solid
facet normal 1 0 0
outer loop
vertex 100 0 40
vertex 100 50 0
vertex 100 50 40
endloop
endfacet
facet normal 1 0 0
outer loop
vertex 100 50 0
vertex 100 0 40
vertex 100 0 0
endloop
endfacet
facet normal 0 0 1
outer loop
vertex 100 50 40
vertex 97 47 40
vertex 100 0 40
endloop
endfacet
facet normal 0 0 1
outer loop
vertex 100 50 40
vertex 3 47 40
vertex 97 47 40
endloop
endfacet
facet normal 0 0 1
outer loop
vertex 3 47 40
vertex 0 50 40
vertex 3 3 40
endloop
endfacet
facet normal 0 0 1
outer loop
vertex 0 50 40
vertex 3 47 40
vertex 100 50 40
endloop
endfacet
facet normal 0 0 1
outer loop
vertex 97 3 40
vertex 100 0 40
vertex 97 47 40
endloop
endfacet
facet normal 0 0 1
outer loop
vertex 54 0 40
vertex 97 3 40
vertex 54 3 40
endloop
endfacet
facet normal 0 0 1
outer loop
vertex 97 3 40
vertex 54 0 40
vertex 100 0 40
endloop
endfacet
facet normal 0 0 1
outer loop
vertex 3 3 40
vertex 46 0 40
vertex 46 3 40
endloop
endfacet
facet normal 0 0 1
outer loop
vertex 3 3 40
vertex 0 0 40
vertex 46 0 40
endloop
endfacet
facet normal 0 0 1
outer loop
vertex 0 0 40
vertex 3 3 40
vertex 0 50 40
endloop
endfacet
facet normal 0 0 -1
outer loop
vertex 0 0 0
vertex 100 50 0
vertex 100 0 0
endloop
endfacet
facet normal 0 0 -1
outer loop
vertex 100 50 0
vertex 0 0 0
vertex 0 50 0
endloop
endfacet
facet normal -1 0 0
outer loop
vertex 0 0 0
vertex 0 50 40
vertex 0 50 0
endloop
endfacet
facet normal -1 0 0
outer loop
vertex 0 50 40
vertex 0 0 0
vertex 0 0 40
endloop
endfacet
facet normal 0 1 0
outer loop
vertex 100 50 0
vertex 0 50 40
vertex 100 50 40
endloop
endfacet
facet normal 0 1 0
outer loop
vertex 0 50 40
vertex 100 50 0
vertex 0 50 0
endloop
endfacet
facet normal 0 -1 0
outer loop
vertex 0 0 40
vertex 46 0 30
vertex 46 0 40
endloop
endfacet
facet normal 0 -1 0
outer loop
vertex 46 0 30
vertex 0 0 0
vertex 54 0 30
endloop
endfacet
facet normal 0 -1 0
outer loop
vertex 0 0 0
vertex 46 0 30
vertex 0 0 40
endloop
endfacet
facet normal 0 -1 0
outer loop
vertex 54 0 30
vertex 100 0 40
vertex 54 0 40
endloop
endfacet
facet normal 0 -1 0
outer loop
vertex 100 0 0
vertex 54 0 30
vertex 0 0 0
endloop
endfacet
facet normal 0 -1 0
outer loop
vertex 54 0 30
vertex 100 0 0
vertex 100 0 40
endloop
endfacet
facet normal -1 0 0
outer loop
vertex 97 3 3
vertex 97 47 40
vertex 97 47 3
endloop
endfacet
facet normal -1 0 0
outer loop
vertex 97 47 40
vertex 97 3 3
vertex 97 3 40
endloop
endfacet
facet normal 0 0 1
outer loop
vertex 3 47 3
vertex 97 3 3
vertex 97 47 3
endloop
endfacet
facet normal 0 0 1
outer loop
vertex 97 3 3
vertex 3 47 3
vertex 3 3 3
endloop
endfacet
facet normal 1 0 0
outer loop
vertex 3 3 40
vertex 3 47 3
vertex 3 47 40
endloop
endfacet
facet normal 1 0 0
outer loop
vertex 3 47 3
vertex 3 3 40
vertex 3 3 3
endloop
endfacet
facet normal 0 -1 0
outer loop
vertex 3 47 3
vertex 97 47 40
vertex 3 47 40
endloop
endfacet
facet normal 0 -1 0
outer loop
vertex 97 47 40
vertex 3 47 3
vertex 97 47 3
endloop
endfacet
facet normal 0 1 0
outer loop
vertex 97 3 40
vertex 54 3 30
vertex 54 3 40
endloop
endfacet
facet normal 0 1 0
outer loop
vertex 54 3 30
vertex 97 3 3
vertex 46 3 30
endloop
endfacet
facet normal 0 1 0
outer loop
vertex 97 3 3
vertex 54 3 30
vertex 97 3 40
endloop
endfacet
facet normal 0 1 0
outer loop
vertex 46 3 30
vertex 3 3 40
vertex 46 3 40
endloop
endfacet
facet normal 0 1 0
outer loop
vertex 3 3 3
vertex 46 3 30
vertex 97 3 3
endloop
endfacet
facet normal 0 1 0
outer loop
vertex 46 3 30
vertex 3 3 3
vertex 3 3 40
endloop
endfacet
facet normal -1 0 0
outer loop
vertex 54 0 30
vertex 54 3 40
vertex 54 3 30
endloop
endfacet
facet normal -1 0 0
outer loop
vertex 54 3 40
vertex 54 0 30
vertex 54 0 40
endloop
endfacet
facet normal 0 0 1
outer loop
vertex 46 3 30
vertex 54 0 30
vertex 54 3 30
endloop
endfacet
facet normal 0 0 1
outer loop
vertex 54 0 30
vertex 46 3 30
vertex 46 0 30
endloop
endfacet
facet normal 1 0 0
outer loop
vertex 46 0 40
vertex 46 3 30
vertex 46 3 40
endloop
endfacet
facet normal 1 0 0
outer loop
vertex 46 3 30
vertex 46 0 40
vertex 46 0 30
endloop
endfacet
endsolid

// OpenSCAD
$fn = 32;

// ----------------------------------------------------------------------
// Enclosure box: notch enclosure
// ----------------------------------------------------------------------

// --- parameters (mm) ---
box_l = 100;              // outer length, X
box_w = 50;               // outer width, Y
box_h = 40;               // outer height
wall_t = 3;               // wall thickness
notch_w = 8;              // cable notch width
notch_h = 10;             // cable notch height

inner_h = box_h - wall_t;  // cavity depth
boss_h = inner_h - 2;  // corner boss height

difference() {
  cube([box_l, box_w, box_h]);
  translate([wall_t, wall_t, wall_t])
    cube([box_l - 2 * wall_t, box_w - 2 * wall_t, box_h]);
  translate([box_l / 2 - notch_w / 2, -1, box_h - notch_h])
    cube([notch_w, wall_t + 2, notch_h + 1]);
}
